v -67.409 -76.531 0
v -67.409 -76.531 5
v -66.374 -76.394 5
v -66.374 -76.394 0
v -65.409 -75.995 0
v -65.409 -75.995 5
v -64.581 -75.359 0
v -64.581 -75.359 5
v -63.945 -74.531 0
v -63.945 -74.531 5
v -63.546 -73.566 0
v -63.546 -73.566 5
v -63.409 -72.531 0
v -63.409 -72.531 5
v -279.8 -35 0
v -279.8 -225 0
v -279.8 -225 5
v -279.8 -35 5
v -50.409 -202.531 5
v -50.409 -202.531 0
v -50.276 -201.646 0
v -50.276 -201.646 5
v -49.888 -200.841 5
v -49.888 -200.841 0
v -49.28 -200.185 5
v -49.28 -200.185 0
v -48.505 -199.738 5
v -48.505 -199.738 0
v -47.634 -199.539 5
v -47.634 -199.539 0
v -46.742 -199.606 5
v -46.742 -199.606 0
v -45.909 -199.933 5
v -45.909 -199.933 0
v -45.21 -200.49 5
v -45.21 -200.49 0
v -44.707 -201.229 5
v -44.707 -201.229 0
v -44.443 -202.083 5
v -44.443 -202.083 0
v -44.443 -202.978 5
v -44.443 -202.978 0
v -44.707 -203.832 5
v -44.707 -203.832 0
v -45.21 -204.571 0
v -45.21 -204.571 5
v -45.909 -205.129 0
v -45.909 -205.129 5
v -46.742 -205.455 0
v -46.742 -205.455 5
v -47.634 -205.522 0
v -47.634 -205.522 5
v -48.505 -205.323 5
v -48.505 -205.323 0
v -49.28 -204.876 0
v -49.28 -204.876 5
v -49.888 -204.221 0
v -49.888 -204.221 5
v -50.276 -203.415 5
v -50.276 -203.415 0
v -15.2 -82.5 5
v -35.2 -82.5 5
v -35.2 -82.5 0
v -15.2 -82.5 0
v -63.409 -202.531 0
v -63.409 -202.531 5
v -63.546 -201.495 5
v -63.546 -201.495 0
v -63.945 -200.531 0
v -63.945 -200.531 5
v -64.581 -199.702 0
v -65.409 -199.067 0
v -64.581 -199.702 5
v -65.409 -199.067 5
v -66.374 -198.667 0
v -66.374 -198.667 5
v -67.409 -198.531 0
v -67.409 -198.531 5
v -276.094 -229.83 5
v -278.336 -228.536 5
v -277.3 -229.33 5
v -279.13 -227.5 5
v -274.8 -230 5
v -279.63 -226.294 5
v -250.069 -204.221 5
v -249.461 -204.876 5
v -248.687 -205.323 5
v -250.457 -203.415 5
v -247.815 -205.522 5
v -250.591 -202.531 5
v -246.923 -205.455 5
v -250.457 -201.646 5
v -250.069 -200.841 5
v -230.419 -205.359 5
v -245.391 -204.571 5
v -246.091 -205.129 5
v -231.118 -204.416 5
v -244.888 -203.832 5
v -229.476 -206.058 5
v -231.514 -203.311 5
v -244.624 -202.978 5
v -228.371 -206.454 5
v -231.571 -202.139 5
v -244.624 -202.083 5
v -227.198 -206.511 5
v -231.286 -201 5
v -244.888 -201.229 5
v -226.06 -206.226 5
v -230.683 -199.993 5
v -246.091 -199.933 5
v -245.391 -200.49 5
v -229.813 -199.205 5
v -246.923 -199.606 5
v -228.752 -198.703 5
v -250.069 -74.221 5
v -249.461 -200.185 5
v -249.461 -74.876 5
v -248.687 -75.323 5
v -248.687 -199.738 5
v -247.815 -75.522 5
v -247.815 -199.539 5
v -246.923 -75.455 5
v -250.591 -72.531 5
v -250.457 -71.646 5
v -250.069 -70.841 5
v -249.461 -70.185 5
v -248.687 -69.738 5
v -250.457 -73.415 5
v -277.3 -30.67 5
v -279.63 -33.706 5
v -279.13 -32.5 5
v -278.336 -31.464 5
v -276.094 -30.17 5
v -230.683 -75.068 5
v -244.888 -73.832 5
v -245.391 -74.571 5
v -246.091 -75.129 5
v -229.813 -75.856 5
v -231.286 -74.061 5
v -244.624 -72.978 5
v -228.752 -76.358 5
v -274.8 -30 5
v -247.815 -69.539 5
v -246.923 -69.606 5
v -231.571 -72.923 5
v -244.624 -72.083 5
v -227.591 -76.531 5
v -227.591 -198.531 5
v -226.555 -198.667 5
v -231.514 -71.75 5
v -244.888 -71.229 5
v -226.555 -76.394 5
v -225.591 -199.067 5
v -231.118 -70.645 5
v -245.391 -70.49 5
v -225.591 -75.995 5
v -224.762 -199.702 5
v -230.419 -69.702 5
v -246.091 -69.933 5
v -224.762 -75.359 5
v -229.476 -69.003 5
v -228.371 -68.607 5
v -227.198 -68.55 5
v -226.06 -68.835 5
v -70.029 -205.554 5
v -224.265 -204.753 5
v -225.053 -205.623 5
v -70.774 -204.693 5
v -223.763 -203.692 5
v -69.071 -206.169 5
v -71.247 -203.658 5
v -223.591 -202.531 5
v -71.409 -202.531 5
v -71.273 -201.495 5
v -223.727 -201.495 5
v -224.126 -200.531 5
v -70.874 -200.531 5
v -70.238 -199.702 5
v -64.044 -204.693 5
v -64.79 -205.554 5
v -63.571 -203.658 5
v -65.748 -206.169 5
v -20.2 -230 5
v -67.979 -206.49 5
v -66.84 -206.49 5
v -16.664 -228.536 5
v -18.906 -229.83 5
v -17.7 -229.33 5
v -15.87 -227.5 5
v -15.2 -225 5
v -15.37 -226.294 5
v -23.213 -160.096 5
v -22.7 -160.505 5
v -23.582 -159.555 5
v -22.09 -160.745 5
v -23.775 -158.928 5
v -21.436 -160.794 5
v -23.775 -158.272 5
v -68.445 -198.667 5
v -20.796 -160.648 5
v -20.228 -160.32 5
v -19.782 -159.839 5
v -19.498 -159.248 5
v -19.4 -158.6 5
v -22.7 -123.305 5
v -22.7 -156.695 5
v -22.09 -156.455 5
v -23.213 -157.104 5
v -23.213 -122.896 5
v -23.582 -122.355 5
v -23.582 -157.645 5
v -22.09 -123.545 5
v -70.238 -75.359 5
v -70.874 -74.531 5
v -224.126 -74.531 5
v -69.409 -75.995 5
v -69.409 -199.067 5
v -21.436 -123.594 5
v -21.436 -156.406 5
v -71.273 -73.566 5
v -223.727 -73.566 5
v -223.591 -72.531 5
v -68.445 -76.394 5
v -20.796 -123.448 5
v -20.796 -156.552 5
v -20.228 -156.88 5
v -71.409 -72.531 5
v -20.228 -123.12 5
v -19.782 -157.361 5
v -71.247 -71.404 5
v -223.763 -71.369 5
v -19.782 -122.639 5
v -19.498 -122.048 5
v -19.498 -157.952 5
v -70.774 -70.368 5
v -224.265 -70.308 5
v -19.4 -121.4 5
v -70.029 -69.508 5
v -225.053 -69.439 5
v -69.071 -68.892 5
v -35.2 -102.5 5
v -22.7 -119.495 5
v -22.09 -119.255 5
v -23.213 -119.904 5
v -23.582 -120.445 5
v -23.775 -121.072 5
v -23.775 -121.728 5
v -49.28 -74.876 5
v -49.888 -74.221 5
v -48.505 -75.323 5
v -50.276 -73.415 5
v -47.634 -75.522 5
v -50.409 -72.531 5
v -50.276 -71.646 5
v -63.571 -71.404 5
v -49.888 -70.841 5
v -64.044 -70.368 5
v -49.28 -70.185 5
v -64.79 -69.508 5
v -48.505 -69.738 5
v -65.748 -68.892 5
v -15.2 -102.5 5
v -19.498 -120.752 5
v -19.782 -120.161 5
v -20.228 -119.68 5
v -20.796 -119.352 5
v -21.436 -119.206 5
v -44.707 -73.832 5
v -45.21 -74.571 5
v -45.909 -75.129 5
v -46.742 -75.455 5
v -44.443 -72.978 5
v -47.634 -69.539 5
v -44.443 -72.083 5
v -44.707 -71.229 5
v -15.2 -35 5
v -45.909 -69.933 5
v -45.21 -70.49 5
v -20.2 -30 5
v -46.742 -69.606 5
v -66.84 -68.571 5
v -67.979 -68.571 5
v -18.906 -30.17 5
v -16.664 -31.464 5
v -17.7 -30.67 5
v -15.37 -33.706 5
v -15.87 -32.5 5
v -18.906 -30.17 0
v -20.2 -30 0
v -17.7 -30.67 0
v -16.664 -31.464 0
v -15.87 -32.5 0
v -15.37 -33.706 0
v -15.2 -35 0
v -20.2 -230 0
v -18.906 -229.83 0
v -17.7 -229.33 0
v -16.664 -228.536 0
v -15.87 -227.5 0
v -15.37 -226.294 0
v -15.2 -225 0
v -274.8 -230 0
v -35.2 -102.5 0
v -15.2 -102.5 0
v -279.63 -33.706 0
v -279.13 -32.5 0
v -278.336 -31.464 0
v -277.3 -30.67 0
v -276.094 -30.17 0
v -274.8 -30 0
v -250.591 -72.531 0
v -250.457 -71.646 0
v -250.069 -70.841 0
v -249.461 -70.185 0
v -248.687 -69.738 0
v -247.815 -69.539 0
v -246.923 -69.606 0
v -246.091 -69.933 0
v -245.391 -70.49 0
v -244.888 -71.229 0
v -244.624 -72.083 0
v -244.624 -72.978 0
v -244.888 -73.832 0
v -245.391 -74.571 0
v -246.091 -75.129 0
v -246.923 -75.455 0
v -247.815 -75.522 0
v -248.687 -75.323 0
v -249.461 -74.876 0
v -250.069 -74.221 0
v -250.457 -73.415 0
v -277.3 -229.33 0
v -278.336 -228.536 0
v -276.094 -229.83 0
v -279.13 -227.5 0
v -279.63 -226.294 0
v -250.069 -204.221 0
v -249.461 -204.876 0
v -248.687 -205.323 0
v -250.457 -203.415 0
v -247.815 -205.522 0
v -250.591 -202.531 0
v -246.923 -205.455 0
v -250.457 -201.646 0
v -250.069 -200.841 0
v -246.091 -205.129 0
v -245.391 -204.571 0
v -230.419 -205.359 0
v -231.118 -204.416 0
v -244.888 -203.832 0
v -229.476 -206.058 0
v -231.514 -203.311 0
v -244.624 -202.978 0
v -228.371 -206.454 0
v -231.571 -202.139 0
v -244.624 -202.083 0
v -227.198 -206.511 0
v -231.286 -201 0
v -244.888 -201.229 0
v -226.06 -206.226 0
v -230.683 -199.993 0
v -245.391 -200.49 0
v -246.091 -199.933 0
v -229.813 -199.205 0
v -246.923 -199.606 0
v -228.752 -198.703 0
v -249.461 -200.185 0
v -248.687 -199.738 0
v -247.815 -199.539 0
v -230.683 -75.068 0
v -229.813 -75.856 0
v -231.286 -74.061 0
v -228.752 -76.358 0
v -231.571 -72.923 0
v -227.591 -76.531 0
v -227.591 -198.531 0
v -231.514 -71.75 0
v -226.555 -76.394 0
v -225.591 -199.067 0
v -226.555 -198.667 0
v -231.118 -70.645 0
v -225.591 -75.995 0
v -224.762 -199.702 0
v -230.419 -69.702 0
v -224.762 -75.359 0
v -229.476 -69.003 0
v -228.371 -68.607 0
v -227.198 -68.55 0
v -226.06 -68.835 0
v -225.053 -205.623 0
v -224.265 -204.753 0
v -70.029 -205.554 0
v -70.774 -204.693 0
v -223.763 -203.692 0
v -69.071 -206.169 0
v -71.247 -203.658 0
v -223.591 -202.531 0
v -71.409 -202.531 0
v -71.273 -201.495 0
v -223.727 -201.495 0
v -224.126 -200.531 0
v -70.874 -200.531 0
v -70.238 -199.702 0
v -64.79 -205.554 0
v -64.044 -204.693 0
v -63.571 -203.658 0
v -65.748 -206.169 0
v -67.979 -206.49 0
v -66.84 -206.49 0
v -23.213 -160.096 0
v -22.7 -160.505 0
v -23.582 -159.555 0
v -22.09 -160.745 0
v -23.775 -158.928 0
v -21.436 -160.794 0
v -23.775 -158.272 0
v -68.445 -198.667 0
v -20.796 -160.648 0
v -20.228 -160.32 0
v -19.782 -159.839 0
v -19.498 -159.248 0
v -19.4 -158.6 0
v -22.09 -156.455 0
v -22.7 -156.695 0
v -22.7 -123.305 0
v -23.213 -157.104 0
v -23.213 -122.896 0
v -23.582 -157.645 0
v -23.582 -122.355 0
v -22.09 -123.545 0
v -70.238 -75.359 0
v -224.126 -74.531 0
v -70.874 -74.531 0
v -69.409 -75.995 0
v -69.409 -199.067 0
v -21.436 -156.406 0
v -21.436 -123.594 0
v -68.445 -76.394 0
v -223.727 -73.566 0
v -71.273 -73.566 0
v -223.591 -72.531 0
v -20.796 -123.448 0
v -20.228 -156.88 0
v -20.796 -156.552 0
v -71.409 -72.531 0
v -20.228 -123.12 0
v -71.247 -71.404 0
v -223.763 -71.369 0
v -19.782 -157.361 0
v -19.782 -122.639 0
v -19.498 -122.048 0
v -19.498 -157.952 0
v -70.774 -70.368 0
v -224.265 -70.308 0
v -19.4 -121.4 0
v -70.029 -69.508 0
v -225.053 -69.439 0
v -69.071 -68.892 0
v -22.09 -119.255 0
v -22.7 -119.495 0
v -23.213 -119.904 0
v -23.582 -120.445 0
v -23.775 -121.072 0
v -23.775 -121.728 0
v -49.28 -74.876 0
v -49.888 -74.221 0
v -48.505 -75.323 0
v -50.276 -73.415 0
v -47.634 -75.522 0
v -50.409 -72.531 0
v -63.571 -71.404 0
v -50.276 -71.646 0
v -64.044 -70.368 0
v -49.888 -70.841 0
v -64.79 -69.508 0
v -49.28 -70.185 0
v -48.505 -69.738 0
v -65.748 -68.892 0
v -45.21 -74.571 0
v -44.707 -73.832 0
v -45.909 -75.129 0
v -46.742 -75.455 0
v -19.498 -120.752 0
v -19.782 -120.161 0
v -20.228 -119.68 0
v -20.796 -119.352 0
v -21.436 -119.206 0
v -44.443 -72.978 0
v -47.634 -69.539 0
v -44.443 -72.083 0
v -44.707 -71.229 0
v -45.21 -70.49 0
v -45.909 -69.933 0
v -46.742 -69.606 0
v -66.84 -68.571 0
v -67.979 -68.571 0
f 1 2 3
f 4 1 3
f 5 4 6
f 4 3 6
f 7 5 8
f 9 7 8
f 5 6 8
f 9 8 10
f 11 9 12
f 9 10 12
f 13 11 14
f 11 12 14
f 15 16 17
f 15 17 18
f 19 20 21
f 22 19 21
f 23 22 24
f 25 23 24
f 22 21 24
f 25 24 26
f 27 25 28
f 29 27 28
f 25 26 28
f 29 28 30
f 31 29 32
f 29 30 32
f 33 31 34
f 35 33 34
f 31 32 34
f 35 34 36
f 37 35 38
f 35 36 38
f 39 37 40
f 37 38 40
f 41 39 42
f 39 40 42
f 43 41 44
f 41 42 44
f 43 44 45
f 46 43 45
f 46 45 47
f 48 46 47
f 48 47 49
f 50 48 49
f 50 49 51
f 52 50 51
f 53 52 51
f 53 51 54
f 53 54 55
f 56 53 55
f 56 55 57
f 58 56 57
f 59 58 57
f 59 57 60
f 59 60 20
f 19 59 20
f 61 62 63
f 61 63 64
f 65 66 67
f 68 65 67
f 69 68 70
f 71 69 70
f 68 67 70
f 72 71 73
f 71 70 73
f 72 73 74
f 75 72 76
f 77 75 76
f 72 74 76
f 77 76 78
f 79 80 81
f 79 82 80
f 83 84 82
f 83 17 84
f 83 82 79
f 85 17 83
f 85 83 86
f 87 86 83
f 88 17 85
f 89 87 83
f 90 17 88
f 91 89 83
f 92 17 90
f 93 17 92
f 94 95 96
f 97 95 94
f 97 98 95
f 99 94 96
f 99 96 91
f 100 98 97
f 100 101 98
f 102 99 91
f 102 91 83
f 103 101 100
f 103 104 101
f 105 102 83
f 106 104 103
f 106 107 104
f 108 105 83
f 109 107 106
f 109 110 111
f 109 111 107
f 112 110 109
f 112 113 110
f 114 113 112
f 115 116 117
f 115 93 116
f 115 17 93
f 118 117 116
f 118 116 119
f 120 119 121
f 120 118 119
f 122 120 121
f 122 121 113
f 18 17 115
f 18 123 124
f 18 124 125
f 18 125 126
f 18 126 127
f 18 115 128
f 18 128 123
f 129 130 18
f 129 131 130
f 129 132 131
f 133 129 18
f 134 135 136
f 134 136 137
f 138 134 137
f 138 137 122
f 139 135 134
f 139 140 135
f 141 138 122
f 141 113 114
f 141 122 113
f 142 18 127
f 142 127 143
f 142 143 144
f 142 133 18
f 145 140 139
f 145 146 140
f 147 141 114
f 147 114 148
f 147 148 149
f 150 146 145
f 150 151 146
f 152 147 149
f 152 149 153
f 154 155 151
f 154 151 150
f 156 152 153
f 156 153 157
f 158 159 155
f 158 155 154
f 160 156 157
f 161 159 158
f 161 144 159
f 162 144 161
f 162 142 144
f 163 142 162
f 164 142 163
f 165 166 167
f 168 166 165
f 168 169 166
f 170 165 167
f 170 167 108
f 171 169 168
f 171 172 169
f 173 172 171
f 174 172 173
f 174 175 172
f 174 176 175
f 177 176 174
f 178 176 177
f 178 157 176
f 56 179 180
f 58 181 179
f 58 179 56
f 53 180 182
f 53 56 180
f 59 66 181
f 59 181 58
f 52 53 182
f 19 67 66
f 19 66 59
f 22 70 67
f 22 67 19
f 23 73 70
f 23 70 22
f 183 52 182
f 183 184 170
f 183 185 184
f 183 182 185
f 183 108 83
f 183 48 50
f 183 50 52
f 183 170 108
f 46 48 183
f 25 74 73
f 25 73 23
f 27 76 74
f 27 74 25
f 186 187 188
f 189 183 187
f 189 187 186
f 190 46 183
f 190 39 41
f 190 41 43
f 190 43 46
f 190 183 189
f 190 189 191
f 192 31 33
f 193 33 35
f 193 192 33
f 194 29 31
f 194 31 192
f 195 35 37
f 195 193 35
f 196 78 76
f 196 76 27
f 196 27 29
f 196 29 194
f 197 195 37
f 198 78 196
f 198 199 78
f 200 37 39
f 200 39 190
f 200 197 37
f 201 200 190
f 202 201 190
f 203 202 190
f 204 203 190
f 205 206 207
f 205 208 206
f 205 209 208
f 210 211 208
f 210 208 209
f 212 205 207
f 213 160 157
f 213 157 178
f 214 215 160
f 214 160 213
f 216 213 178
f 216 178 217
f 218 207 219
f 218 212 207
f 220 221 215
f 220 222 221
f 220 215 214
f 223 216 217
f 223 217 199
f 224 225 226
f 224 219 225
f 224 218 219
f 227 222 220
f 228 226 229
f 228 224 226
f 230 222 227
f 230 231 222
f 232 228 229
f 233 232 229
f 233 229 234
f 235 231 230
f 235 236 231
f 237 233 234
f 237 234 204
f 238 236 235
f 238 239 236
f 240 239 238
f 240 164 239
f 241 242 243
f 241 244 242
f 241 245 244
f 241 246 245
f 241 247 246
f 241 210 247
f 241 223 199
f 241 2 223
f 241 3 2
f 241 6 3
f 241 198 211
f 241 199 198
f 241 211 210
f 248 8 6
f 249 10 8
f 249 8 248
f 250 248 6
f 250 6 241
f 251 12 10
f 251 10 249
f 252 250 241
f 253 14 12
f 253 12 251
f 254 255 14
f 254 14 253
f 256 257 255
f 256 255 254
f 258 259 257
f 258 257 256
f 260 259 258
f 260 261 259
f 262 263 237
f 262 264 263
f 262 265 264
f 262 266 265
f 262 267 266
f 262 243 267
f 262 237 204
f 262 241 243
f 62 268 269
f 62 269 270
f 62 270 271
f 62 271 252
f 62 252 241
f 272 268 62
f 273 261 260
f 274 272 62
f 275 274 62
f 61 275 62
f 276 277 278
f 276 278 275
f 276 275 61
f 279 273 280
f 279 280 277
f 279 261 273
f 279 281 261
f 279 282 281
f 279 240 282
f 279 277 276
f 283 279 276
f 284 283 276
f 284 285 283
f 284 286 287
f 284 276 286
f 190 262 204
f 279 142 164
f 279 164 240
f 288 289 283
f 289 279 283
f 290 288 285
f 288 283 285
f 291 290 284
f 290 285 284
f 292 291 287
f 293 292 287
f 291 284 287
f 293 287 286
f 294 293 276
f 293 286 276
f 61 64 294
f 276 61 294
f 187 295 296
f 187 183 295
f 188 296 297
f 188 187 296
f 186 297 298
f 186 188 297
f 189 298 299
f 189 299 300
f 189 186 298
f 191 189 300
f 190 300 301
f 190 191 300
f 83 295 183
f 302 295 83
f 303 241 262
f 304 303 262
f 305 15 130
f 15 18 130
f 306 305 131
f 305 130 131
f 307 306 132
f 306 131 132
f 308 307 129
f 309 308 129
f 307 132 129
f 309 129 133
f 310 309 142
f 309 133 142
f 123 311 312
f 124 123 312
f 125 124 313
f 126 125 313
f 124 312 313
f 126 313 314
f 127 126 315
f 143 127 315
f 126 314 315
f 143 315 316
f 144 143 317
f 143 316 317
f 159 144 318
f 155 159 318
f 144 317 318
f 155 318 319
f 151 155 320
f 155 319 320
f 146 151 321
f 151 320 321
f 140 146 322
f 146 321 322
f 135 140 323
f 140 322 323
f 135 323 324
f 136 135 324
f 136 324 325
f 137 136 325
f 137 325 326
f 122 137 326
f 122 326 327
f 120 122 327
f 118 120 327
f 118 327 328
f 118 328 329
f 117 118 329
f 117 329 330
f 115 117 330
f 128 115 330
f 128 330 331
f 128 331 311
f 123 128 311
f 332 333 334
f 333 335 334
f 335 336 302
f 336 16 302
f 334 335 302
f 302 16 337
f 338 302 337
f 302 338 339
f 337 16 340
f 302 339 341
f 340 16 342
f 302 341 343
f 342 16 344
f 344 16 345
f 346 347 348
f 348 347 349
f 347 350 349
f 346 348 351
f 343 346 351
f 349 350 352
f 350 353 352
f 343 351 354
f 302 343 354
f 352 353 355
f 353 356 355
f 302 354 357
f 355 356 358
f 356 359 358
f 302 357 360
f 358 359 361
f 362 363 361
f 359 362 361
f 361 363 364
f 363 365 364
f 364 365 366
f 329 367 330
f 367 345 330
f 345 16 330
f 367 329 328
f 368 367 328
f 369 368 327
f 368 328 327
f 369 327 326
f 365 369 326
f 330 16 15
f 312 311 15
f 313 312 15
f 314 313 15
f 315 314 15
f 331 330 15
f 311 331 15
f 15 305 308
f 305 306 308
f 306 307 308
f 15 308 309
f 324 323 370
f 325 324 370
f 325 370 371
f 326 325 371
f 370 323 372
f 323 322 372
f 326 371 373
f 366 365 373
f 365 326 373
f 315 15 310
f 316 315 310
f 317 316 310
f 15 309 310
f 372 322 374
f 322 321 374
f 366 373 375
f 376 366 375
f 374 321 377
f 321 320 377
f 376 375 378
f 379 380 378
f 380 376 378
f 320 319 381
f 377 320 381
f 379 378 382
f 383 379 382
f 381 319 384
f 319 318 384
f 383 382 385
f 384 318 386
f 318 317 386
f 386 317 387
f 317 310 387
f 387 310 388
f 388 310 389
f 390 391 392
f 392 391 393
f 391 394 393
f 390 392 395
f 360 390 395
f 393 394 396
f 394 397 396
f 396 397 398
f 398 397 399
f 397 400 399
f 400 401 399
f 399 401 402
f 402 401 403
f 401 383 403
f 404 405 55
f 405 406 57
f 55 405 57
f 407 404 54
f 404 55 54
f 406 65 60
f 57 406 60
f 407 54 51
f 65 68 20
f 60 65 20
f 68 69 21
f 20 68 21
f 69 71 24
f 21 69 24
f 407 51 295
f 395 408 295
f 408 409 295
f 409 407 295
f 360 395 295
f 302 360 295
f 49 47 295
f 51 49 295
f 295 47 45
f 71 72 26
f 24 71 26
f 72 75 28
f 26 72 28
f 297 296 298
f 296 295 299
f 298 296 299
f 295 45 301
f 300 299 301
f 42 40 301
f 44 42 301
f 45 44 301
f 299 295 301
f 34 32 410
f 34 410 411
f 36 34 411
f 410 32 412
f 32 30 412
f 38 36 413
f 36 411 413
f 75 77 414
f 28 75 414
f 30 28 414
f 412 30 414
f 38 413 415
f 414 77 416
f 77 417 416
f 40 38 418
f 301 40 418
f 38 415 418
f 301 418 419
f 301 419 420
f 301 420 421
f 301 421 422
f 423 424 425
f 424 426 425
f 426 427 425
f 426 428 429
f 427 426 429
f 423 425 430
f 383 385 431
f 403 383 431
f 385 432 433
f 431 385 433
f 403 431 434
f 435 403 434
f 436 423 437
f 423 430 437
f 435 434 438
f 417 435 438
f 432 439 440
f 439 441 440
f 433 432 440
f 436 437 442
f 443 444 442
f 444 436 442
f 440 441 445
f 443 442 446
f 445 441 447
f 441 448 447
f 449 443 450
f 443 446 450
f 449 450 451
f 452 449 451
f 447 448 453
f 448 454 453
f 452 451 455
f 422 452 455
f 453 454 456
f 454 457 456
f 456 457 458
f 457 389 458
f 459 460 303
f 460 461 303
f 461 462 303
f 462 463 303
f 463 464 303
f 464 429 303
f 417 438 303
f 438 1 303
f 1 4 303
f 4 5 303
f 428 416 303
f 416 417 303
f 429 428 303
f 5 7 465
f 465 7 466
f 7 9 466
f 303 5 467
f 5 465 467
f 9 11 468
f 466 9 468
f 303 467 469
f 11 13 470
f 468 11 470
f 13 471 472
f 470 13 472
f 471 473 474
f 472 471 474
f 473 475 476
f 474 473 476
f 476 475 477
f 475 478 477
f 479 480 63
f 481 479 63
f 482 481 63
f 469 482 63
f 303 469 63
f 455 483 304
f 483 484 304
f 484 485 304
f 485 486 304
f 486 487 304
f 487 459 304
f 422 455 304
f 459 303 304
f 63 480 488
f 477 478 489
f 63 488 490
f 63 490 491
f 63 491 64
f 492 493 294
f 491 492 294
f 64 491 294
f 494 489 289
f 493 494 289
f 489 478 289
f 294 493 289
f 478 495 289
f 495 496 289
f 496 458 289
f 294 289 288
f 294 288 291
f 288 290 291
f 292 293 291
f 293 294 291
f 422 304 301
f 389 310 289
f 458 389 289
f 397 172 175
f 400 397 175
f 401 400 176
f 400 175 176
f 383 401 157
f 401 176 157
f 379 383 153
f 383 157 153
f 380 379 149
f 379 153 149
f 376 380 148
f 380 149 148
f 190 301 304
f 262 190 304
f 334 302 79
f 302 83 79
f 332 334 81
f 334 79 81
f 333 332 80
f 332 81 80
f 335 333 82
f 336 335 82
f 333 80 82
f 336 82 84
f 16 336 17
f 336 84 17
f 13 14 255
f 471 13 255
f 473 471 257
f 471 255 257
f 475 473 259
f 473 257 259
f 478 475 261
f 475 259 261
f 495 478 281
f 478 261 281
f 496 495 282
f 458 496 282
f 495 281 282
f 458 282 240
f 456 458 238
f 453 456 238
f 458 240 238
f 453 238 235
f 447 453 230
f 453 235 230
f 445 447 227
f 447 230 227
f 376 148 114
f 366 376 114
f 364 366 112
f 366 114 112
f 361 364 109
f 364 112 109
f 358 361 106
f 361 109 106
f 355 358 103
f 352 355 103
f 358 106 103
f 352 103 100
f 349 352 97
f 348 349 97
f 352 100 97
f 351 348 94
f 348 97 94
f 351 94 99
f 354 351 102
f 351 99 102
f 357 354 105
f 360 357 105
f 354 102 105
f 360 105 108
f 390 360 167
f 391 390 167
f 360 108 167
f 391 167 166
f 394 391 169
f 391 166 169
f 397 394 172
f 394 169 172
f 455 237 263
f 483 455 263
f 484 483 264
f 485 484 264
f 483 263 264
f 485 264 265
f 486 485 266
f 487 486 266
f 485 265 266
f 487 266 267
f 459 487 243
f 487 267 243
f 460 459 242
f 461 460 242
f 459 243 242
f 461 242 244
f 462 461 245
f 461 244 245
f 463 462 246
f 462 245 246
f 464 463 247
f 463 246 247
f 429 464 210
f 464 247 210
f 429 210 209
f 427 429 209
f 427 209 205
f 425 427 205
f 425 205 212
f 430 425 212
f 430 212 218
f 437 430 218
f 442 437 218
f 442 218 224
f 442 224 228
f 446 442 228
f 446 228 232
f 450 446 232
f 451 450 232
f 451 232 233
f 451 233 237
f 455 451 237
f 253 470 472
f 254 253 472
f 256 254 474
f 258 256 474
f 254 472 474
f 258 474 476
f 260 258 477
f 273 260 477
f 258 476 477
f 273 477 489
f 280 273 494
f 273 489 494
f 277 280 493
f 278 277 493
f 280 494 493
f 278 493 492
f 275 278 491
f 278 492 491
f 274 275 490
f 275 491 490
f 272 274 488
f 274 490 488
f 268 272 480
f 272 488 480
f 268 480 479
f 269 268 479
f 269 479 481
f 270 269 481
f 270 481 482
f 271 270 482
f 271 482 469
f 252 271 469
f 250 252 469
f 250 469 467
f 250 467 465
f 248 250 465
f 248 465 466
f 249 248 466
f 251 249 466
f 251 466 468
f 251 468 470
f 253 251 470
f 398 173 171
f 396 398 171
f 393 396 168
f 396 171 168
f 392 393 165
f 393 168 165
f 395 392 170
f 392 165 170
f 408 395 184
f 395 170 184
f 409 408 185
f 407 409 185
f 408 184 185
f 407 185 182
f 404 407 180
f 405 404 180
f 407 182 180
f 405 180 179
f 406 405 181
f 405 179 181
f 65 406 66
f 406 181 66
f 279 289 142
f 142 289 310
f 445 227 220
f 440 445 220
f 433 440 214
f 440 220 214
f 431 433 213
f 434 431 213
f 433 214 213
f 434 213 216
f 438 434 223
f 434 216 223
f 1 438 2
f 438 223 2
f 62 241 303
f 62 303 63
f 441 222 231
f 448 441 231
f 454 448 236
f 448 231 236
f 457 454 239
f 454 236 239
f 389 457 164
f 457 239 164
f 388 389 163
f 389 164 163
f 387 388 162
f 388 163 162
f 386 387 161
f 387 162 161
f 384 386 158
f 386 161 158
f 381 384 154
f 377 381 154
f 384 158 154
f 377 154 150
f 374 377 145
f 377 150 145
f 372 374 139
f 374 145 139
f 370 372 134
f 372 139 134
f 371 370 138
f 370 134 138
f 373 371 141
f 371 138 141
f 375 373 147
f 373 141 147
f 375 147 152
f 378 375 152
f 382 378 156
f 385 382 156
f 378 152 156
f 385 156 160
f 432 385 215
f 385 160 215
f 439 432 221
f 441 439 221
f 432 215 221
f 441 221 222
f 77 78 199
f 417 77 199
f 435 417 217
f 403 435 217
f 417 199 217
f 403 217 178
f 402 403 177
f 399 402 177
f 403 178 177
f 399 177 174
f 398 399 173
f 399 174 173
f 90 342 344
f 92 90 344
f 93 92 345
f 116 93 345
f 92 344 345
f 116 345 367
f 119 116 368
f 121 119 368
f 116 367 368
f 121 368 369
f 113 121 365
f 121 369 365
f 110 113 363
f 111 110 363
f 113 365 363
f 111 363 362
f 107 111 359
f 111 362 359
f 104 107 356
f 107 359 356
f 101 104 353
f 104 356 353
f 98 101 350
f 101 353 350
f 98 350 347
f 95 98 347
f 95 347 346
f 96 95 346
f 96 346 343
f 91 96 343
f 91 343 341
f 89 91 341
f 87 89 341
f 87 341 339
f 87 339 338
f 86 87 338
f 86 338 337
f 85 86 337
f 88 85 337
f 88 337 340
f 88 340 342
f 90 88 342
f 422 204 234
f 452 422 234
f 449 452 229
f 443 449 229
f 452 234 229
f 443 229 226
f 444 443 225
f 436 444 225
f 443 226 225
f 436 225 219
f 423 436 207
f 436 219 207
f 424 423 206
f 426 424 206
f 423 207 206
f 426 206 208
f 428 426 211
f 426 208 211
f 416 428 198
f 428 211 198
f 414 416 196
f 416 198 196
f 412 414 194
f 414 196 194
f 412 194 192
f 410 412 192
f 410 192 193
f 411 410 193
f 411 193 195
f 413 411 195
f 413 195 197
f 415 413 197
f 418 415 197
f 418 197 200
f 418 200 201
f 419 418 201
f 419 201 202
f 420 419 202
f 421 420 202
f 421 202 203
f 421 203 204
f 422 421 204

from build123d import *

# Parameters (mm, degrees)
ESQUISSE1_W             = 295
ESQUISSE1_H             = 260
BOSS_EXTRU_1_DEPTH      = 5
ESQUISSE3_OUTSIDE_W     = 375.652
ESQUISSE3_OUTSIDE_H     = 340.652
ESQUISSE3_OUTSIDE_W_2   = 264.6
ESQUISSE3_OUTSIDE_H_2   = 200
ENL_V_MAT_EXTRU_2_DEPTH = 394.255642045
CONG_1_R                = 5
ESQUISSE4_R             = 3
ENL_V_MAT_EXTRU_3_DEPTH = 363.233405417
ESQUISSE5_R             = 4
ENL_V_MAT_EXTRU_4_DEPTH = 363.233405417
ESQUISSE8_R             = 2.2
ENL_V_MAT_EXTRU_7_DEPTH = 363.233405417
ESQUISSE9_W             = 20
ESQUISSE9_H             = 20
ENL_V_MAT_EXTRU_8_DEPTH = 363.233405417


with BuildPart() as part:
    # Esquisse1 → Boss.-Extru.1 (new body)
    with BuildSketch(Plane.XY):
        with Locations((-147.5, -130)):
            Rectangle(ESQUISSE1_W, ESQUISSE1_H)
    extrude(amount=BOSS_EXTRU_1_DEPTH)

    # Esquisse3 outside → Enlèv. mat.-Extru.2 (cut, through all)
    with BuildSketch(Plane(origin=(0, 0, 0), x_dir=(-1, 0, 0), z_dir=(0, 0, -1))):
        with Locations((147.5, -130)):
            Rectangle(ESQUISSE3_OUTSIDE_W, ESQUISSE3_OUTSIDE_H)
        with Locations((147.5, -130)):
            Rectangle(ESQUISSE3_OUTSIDE_W_2, ESQUISSE3_OUTSIDE_H_2, mode=Mode.SUBTRACT)
    extrude(amount=-ENL_V_MAT_EXTRU_2_DEPTH, mode=Mode.SUBTRACT)

    # Congé1
    cong_1_edges = [part.edges().sort_by_distance(p)[0] for p in [
        (-279.8, -30, 2.5),
        (-15.2, -30, 2.5),
        (-279.8, -230, 2.5),
        (-15.2, -230, 2.5),
    ]]
    fillet(cong_1_edges, radius=CONG_1_R)

    # Esquisse4 → Enlèv. mat.-Extru.3 (cut, through all)
    with BuildSketch(Plane(origin=(0, 0, 0), x_dir=(-1, 0, 0), z_dir=(0, 0, -1))):
        with Locations((47.409458813, -72.530608435)):
            Circle(ESQUISSE4_R)
        with Locations((47.409458813, -202.530608435)):
            Circle(ESQUISSE4_R)
        with Locations((247.590541187, -202.530608435)):
            Circle(ESQUISSE4_R)
        with Locations((247.590541187, -72.530608435)):
            Circle(ESQUISSE4_R)
    extrude(amount=-ENL_V_MAT_EXTRU_3_DEPTH, mode=Mode.SUBTRACT)

    # Esquisse5 → Enlèv. mat.-Extru.4 (cut, through all)
    with BuildSketch(Plane.XY.offset(5)):
        with Locations((-227.590541187, -202.530608435)):
            Circle(ESQUISSE5_R)
        with Locations((-67.409458813, -202.530608435)):
            Circle(ESQUISSE5_R)
        with Locations((-227.590541187, -72.530608435)):
            Circle(ESQUISSE5_R)
        with Locations((-67.409458813, -72.530608435)):
            Circle(ESQUISSE5_R)
    extrude(amount=-ENL_V_MAT_EXTRU_4_DEPTH, mode=Mode.SUBTRACT)

    # Esquisse8 → Enlèv. mat.-Extru.7 (cut, through all)
    with BuildSketch(Plane.XY.offset(5)):
        with Locations((-21.6, -158.6)):
            Circle(ESQUISSE8_R)
        with Locations((-21.6, -121.4)):
            Circle(ESQUISSE8_R)
    extrude(amount=-ENL_V_MAT_EXTRU_7_DEPTH, mode=Mode.SUBTRACT)

    # Esquisse9 → Enlèv. mat.-Extru.8 (cut, through all)
    with BuildSketch(Plane.XY.offset(5)):
        with Locations((-25.2, -92.5)):
            Rectangle(ESQUISSE9_W, ESQUISSE9_H)
    extrude(amount=-ENL_V_MAT_EXTRU_8_DEPTH, mode=Mode.SUBTRACT)


solid = part.part
